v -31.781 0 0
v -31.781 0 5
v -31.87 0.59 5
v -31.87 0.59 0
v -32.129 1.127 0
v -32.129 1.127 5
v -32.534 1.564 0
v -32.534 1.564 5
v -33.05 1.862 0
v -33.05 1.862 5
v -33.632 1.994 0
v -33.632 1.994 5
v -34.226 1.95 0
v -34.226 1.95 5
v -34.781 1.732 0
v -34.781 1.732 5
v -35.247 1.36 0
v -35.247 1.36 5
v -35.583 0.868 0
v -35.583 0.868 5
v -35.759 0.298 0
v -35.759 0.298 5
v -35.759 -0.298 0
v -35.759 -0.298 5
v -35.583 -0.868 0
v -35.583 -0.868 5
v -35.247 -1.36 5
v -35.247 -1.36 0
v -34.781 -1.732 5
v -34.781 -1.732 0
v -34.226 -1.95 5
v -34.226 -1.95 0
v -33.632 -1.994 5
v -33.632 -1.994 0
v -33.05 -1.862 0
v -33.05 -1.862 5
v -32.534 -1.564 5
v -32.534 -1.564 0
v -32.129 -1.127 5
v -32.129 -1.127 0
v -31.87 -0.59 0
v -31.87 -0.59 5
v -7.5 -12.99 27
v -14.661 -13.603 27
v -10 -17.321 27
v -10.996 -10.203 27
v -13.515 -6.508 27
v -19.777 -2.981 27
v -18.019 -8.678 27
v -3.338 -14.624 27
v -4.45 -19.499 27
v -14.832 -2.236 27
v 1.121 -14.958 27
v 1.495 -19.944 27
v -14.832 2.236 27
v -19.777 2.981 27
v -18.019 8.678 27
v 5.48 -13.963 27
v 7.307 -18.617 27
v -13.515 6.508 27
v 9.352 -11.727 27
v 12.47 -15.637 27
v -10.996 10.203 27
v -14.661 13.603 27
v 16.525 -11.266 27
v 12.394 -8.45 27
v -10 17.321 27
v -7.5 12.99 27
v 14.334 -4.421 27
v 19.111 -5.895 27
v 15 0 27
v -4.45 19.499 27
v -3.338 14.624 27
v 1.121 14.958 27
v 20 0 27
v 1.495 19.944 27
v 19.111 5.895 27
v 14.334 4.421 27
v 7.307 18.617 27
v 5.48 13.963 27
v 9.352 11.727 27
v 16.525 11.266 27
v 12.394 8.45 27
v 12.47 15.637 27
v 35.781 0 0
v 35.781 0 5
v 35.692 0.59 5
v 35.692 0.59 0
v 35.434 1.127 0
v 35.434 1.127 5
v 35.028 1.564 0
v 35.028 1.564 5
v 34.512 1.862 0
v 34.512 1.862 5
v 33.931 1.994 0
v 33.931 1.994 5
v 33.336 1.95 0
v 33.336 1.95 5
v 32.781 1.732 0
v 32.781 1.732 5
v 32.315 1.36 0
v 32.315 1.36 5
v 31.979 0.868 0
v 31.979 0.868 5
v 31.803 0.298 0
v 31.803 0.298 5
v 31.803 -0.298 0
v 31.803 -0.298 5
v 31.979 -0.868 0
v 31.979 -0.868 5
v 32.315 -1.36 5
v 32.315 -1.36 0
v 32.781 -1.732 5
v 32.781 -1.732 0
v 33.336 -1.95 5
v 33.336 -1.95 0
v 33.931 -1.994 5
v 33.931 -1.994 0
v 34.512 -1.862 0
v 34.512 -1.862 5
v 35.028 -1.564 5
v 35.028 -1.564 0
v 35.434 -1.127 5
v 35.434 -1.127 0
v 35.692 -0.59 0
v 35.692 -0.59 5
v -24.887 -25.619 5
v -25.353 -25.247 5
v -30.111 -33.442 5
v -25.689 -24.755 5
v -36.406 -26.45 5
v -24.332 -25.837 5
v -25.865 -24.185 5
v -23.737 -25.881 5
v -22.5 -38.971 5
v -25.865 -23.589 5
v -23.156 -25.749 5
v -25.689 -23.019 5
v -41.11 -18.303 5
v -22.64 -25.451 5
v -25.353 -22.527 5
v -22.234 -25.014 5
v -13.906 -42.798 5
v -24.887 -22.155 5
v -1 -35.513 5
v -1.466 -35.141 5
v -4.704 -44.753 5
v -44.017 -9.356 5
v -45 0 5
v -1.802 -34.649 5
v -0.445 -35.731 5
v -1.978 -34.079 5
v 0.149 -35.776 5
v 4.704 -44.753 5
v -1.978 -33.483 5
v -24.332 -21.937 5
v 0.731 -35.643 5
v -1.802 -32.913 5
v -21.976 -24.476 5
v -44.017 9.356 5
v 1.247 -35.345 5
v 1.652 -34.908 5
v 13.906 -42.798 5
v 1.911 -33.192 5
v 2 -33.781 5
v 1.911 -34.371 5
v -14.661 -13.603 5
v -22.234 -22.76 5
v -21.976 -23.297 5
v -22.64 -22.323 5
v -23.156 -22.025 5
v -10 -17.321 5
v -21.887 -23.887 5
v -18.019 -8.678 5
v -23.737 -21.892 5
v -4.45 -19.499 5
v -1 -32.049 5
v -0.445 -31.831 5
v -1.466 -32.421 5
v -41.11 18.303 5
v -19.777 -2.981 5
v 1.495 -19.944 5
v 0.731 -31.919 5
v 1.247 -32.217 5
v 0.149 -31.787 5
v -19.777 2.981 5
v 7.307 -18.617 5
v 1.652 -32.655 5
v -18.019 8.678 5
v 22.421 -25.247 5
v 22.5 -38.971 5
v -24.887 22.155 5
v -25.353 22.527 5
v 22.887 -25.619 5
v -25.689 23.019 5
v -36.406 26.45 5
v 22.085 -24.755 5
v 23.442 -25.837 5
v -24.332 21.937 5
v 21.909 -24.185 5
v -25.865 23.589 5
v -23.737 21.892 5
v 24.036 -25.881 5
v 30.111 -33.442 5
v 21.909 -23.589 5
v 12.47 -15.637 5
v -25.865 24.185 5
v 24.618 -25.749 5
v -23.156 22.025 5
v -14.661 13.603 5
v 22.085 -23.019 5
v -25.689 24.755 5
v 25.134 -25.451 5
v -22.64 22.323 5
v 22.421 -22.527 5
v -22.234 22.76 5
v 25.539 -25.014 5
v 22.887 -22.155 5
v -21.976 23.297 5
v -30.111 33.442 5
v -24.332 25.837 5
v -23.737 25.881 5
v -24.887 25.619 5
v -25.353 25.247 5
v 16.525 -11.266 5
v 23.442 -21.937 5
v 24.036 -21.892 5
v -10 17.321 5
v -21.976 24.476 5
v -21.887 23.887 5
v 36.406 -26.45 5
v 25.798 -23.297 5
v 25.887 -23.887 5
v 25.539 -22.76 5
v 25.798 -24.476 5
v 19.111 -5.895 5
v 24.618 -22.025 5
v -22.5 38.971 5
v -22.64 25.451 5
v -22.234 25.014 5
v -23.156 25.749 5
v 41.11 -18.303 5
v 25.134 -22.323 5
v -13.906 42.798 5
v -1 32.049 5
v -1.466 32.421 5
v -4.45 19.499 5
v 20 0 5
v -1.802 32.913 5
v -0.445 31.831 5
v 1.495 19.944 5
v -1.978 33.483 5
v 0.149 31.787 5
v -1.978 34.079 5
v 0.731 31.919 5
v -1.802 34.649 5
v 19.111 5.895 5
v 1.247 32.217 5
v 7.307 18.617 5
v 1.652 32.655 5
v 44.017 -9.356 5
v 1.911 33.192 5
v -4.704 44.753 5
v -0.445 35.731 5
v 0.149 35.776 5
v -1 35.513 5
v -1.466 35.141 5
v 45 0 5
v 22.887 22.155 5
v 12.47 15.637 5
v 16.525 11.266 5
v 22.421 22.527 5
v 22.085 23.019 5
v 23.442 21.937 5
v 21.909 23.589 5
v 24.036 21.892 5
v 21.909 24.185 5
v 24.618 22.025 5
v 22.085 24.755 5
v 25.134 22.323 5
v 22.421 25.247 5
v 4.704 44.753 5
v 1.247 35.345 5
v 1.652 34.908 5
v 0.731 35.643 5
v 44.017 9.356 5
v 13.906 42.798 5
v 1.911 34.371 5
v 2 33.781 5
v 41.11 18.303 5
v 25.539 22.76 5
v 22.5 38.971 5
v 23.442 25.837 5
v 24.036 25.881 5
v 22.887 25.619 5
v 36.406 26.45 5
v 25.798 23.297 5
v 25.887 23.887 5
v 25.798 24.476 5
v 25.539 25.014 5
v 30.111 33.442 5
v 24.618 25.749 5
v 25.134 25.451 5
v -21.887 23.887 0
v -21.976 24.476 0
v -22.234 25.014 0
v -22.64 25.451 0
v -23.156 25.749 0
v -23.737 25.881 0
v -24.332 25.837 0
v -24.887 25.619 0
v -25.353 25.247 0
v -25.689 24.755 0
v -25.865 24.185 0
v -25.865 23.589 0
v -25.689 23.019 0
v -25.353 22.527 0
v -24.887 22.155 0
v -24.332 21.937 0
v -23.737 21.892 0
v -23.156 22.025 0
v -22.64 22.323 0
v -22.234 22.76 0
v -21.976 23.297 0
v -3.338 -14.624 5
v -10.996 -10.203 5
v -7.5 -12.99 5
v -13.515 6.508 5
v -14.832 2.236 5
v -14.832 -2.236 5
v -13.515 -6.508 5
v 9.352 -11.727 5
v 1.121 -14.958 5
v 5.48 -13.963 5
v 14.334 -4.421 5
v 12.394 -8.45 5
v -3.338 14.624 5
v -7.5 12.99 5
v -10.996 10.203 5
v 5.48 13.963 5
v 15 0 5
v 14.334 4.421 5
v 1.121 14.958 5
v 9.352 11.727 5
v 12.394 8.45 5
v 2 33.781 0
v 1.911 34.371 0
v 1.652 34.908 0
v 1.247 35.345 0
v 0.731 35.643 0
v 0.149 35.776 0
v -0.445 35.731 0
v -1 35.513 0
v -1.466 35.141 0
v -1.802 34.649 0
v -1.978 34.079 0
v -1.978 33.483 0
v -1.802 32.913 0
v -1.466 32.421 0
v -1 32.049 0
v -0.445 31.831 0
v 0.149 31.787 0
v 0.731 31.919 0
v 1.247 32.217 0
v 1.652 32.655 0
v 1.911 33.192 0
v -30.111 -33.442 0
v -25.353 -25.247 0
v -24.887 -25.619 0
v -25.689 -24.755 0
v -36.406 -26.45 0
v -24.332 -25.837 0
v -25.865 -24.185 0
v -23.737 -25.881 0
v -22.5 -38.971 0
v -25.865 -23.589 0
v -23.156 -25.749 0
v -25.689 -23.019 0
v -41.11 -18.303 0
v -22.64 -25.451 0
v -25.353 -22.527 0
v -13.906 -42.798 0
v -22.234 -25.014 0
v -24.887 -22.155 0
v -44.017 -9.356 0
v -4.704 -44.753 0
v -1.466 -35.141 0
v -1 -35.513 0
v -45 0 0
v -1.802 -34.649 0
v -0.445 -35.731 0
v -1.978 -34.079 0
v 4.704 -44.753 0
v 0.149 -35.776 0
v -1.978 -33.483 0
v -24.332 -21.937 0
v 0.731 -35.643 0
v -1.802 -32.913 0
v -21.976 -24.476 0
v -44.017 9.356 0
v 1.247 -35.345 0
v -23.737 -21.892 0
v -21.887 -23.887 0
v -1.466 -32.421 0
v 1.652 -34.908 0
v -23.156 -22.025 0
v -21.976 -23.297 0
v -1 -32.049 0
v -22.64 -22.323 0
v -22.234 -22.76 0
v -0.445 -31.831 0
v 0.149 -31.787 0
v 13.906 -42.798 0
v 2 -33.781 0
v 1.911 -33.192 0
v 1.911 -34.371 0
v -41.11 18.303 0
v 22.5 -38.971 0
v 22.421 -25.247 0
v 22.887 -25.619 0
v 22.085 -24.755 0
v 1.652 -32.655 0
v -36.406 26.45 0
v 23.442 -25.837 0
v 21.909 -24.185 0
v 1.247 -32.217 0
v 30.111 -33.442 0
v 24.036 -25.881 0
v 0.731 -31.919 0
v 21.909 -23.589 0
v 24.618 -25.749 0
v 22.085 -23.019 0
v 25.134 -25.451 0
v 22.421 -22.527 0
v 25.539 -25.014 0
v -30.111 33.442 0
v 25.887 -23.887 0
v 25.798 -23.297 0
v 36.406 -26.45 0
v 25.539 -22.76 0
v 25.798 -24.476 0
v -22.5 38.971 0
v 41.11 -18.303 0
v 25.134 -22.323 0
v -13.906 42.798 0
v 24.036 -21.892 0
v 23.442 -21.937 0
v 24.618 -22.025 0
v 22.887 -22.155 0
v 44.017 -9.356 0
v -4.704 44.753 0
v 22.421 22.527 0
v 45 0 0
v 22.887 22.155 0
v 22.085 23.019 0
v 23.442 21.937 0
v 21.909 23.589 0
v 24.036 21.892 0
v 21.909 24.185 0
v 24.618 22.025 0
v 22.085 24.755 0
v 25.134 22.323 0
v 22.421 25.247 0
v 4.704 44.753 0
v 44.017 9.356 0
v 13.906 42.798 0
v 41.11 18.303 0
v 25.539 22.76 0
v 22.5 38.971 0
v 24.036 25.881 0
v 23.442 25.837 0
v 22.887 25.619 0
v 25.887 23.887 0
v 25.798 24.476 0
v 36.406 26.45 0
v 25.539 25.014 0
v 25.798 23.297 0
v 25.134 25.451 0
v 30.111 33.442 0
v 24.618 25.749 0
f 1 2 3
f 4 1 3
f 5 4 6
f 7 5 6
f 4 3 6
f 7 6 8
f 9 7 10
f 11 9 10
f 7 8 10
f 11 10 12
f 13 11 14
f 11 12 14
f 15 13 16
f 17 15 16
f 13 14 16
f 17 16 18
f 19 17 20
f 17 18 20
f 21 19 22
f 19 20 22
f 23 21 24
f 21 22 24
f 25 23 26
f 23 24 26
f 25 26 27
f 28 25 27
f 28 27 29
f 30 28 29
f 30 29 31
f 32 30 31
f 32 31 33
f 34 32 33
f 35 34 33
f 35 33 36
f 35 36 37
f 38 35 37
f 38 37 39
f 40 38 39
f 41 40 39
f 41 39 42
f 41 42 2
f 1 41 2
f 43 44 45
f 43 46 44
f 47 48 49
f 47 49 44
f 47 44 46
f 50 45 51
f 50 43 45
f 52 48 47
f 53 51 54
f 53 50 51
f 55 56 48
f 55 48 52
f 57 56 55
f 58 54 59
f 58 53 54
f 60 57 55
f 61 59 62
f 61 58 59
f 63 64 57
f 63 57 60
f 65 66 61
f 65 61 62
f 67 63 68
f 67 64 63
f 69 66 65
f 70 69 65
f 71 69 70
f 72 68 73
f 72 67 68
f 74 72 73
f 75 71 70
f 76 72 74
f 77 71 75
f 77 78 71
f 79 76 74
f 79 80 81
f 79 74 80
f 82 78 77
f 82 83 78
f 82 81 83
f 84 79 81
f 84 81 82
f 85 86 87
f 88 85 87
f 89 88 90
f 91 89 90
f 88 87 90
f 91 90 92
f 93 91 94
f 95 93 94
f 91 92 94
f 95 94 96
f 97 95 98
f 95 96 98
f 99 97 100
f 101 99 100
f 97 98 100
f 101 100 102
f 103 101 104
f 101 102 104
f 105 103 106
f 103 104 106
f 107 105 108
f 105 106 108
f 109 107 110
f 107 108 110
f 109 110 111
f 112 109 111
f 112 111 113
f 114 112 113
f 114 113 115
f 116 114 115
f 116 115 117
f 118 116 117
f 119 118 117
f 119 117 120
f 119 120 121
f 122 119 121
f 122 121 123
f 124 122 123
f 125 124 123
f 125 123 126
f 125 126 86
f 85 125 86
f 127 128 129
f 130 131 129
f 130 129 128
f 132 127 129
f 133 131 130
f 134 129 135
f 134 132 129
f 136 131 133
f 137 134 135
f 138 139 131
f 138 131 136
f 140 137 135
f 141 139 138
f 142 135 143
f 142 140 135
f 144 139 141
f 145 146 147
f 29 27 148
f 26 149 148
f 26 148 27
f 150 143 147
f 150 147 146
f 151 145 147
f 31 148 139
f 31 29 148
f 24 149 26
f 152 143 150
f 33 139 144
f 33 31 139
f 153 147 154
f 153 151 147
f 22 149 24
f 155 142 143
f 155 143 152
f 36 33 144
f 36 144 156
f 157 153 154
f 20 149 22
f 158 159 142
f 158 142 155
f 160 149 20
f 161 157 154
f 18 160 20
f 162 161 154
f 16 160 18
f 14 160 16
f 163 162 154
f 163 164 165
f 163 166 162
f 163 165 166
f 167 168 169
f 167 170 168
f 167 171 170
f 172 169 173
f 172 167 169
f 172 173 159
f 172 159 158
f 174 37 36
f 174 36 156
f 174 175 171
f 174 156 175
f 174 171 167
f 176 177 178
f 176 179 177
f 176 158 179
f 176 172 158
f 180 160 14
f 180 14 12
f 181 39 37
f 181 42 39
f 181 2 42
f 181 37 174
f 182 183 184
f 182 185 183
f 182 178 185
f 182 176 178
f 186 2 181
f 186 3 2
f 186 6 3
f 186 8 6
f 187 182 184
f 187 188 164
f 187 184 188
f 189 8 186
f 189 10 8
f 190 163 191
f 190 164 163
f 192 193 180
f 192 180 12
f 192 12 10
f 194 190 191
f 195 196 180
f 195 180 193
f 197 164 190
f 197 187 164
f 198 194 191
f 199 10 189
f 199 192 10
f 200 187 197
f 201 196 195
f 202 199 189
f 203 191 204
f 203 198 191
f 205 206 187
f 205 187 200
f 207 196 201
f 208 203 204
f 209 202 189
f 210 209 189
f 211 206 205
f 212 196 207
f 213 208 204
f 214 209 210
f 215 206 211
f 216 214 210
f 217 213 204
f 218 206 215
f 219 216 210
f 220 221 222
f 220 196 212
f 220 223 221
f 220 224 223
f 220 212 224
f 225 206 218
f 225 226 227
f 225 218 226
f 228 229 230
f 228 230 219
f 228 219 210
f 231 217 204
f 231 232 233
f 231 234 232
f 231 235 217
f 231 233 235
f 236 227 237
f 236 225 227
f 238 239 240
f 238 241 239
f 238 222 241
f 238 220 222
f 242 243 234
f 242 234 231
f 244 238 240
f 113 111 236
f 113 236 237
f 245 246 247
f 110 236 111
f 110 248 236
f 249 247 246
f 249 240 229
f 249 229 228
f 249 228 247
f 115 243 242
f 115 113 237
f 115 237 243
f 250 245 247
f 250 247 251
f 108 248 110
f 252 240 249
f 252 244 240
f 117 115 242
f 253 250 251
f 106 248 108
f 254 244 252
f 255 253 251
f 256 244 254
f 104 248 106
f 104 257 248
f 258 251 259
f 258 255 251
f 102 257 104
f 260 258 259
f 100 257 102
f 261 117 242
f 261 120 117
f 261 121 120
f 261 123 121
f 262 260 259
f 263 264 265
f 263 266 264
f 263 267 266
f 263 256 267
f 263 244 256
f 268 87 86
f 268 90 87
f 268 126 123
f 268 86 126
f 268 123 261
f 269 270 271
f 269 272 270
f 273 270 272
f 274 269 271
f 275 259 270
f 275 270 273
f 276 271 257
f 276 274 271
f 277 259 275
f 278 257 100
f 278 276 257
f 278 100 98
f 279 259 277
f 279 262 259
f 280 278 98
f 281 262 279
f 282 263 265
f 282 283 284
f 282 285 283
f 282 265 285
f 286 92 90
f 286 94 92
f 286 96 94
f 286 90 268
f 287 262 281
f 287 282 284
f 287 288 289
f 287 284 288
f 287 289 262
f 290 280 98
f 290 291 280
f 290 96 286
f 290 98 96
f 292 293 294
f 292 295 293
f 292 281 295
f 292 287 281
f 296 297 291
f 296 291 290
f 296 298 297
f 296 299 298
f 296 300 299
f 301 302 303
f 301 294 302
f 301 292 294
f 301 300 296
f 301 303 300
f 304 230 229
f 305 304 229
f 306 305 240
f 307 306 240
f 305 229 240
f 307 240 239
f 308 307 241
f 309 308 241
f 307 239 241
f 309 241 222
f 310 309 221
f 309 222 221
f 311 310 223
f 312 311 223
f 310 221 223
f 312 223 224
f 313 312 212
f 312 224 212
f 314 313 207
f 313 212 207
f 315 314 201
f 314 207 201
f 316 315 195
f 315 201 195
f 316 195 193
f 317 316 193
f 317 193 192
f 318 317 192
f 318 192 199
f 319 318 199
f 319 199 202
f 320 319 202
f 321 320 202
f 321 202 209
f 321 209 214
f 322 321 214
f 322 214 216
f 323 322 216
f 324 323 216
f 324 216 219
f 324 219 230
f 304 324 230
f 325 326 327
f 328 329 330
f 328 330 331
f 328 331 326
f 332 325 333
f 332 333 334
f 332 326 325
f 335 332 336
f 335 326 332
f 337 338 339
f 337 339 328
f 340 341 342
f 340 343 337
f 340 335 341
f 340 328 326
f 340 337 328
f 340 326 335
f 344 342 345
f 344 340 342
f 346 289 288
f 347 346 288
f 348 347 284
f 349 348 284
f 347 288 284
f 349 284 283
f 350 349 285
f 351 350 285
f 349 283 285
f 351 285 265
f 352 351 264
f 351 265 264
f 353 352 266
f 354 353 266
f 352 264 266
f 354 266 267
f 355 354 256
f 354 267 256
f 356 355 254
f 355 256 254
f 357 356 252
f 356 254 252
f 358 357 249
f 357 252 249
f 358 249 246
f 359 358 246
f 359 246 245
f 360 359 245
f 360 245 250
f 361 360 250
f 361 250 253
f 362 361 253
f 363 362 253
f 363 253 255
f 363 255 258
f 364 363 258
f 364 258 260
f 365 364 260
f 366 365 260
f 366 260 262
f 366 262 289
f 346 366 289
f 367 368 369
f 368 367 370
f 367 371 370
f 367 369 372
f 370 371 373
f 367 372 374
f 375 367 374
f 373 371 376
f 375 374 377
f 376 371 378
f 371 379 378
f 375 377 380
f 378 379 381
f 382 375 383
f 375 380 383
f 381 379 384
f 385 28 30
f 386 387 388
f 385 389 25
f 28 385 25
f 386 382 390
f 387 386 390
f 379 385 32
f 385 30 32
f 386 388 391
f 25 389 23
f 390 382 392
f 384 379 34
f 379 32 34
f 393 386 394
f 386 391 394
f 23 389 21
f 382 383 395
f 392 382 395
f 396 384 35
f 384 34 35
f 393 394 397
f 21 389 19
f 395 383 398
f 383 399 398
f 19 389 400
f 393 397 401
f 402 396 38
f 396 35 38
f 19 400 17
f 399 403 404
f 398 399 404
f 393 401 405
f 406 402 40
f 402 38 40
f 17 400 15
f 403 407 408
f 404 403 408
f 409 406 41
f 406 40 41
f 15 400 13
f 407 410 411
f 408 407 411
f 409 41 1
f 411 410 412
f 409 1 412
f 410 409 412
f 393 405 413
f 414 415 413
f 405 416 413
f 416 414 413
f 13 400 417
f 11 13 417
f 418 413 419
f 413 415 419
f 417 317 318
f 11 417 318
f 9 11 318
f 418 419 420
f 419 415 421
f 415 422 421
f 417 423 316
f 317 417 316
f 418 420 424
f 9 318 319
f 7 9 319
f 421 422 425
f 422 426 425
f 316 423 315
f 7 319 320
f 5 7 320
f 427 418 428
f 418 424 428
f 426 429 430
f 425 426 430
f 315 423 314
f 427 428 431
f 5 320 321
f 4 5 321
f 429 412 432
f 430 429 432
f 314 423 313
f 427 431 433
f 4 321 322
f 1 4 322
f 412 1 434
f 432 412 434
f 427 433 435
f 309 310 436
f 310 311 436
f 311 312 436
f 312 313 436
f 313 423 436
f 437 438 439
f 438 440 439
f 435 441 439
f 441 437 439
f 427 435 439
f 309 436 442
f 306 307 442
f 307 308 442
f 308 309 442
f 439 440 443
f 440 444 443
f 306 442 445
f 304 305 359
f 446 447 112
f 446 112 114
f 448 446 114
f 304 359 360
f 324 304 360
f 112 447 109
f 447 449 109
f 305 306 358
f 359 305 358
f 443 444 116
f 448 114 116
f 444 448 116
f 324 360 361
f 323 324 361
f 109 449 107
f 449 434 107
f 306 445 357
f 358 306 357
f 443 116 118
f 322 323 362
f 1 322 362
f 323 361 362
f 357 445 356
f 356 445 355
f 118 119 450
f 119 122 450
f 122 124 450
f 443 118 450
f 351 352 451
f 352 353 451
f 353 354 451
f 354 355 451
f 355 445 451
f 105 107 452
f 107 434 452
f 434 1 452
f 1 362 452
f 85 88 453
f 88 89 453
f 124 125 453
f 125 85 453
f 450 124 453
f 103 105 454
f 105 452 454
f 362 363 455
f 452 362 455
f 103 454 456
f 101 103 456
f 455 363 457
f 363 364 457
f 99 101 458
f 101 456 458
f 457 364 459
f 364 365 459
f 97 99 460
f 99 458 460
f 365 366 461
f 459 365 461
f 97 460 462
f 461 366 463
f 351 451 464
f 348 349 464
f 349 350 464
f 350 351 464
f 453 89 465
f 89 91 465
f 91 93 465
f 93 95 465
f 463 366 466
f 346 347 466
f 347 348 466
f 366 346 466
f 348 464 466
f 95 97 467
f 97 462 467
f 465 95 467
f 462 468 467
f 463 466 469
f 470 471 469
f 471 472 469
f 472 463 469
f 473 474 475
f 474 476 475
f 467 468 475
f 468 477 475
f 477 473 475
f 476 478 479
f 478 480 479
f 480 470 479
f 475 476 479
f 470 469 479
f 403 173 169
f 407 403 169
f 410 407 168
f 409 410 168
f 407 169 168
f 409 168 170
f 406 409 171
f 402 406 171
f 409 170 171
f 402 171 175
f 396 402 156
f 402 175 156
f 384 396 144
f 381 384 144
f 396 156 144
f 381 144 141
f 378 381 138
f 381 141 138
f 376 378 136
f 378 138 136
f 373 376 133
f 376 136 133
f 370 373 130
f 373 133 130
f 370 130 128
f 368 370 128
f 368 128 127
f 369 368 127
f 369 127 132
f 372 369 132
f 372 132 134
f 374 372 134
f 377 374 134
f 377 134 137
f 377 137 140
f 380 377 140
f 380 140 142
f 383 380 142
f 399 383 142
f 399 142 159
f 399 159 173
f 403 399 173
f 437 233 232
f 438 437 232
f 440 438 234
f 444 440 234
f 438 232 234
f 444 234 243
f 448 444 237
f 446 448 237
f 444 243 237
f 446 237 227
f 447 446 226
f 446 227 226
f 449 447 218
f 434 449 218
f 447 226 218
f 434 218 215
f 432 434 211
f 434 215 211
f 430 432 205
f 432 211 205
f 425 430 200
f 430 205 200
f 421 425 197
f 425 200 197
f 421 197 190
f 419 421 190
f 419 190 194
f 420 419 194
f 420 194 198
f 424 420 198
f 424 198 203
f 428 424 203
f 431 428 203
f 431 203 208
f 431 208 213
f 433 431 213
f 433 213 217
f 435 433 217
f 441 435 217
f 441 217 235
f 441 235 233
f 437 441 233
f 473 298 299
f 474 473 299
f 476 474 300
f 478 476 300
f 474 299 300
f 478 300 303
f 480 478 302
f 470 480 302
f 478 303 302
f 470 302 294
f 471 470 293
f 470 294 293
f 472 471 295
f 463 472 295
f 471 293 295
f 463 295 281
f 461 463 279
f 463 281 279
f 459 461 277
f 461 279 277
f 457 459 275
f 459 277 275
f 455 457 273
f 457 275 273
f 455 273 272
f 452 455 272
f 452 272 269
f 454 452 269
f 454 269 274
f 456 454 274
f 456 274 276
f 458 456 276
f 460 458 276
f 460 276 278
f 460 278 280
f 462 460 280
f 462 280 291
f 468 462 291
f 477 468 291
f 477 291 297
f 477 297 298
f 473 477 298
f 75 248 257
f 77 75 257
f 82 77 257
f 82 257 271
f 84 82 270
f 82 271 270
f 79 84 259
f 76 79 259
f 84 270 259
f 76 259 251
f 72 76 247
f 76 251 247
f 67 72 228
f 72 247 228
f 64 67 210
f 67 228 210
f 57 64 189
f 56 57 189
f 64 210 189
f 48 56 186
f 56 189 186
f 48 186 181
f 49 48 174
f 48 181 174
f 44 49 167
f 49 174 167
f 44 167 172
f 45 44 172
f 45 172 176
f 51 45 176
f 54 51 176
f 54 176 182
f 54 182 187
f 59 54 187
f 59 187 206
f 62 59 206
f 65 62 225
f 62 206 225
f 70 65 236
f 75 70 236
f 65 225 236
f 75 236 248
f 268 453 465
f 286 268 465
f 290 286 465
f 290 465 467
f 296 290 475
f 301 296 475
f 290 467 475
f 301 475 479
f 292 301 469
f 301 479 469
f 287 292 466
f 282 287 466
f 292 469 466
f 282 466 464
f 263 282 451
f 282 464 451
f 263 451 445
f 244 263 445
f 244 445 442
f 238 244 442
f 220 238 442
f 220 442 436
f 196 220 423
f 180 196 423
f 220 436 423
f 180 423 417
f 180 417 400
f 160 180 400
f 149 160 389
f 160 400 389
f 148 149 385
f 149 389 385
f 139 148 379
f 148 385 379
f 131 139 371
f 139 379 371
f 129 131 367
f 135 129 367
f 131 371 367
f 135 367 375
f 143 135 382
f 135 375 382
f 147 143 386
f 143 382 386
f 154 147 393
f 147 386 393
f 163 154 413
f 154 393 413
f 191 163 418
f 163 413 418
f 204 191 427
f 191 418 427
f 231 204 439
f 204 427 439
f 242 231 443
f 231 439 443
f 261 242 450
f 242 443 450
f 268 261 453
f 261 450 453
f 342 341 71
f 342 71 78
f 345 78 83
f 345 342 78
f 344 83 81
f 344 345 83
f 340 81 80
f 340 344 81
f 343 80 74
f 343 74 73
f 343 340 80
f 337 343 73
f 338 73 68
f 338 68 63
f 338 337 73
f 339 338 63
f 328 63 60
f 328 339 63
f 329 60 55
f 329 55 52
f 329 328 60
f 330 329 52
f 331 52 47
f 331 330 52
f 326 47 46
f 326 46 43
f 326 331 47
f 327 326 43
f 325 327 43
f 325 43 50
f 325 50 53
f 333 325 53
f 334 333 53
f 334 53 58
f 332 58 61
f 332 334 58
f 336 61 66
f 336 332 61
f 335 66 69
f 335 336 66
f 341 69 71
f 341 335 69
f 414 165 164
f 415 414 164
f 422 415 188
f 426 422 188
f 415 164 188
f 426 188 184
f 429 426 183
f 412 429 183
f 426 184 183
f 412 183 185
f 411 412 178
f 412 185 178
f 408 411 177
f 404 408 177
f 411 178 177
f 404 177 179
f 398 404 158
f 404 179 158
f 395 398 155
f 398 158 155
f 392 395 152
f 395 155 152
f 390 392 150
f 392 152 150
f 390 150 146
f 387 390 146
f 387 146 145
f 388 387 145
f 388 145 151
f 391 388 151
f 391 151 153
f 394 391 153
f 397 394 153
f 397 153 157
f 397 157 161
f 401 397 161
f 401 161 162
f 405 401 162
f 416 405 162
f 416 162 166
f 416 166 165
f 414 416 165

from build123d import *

# Parameters (mm, degrees)
SKETCH_1_R          = 45
EXTRUDE_1_DEPTH     = 5
SKETCH_2_R          = 20
SKETCH_2_R_2        = 15
EXTRUDE_2_DEPTH     = 22
SKETCH_3_R          = 2
CUT_EXTRUDE_3_DEPTH = 68.334983478


with BuildPart() as part:
    # Эскиз1 → Вытянуть1 (new body)
    with BuildSketch(Plane.XY):
        Circle(SKETCH_1_R)
    extrude(amount=EXTRUDE_1_DEPTH)

    # Эскиз2 → Вытянуть2 (add)
    with BuildSketch(Plane.XY.offset(5)):
        Circle(SKETCH_2_R)
        Circle(SKETCH_2_R_2, mode=Mode.SUBTRACT)
    extrude(amount=EXTRUDE_2_DEPTH)

    # Эскиз3 → Вытянуть3 (cut, through all)
    with BuildSketch(Plane.XY.offset(5)):
        with Locations((0, 33.781150957)):
            Circle(SKETCH_3_R)
        with Locations((23.886880918, 23.886880918)):
            Circle(SKETCH_3_R)
        with Locations((33.781150957, 0)):
            Circle(SKETCH_3_R)
        with Locations((23.886880918, -23.886880918)):
            Circle(SKETCH_3_R)
        with Locations((0, -33.781150957)):
            Circle(SKETCH_3_R)
        with Locations((-23.886880918, -23.886880918)):
            Circle(SKETCH_3_R)
        with Locations((-33.781150957, 0)):
            Circle(SKETCH_3_R)
        with Locations((-23.886880918, 23.886880918)):
            Circle(SKETCH_3_R)
    extrude(amount=-CUT_EXTRUDE_3_DEPTH, mode=Mode.SUBTRACT)


solid = part.part
